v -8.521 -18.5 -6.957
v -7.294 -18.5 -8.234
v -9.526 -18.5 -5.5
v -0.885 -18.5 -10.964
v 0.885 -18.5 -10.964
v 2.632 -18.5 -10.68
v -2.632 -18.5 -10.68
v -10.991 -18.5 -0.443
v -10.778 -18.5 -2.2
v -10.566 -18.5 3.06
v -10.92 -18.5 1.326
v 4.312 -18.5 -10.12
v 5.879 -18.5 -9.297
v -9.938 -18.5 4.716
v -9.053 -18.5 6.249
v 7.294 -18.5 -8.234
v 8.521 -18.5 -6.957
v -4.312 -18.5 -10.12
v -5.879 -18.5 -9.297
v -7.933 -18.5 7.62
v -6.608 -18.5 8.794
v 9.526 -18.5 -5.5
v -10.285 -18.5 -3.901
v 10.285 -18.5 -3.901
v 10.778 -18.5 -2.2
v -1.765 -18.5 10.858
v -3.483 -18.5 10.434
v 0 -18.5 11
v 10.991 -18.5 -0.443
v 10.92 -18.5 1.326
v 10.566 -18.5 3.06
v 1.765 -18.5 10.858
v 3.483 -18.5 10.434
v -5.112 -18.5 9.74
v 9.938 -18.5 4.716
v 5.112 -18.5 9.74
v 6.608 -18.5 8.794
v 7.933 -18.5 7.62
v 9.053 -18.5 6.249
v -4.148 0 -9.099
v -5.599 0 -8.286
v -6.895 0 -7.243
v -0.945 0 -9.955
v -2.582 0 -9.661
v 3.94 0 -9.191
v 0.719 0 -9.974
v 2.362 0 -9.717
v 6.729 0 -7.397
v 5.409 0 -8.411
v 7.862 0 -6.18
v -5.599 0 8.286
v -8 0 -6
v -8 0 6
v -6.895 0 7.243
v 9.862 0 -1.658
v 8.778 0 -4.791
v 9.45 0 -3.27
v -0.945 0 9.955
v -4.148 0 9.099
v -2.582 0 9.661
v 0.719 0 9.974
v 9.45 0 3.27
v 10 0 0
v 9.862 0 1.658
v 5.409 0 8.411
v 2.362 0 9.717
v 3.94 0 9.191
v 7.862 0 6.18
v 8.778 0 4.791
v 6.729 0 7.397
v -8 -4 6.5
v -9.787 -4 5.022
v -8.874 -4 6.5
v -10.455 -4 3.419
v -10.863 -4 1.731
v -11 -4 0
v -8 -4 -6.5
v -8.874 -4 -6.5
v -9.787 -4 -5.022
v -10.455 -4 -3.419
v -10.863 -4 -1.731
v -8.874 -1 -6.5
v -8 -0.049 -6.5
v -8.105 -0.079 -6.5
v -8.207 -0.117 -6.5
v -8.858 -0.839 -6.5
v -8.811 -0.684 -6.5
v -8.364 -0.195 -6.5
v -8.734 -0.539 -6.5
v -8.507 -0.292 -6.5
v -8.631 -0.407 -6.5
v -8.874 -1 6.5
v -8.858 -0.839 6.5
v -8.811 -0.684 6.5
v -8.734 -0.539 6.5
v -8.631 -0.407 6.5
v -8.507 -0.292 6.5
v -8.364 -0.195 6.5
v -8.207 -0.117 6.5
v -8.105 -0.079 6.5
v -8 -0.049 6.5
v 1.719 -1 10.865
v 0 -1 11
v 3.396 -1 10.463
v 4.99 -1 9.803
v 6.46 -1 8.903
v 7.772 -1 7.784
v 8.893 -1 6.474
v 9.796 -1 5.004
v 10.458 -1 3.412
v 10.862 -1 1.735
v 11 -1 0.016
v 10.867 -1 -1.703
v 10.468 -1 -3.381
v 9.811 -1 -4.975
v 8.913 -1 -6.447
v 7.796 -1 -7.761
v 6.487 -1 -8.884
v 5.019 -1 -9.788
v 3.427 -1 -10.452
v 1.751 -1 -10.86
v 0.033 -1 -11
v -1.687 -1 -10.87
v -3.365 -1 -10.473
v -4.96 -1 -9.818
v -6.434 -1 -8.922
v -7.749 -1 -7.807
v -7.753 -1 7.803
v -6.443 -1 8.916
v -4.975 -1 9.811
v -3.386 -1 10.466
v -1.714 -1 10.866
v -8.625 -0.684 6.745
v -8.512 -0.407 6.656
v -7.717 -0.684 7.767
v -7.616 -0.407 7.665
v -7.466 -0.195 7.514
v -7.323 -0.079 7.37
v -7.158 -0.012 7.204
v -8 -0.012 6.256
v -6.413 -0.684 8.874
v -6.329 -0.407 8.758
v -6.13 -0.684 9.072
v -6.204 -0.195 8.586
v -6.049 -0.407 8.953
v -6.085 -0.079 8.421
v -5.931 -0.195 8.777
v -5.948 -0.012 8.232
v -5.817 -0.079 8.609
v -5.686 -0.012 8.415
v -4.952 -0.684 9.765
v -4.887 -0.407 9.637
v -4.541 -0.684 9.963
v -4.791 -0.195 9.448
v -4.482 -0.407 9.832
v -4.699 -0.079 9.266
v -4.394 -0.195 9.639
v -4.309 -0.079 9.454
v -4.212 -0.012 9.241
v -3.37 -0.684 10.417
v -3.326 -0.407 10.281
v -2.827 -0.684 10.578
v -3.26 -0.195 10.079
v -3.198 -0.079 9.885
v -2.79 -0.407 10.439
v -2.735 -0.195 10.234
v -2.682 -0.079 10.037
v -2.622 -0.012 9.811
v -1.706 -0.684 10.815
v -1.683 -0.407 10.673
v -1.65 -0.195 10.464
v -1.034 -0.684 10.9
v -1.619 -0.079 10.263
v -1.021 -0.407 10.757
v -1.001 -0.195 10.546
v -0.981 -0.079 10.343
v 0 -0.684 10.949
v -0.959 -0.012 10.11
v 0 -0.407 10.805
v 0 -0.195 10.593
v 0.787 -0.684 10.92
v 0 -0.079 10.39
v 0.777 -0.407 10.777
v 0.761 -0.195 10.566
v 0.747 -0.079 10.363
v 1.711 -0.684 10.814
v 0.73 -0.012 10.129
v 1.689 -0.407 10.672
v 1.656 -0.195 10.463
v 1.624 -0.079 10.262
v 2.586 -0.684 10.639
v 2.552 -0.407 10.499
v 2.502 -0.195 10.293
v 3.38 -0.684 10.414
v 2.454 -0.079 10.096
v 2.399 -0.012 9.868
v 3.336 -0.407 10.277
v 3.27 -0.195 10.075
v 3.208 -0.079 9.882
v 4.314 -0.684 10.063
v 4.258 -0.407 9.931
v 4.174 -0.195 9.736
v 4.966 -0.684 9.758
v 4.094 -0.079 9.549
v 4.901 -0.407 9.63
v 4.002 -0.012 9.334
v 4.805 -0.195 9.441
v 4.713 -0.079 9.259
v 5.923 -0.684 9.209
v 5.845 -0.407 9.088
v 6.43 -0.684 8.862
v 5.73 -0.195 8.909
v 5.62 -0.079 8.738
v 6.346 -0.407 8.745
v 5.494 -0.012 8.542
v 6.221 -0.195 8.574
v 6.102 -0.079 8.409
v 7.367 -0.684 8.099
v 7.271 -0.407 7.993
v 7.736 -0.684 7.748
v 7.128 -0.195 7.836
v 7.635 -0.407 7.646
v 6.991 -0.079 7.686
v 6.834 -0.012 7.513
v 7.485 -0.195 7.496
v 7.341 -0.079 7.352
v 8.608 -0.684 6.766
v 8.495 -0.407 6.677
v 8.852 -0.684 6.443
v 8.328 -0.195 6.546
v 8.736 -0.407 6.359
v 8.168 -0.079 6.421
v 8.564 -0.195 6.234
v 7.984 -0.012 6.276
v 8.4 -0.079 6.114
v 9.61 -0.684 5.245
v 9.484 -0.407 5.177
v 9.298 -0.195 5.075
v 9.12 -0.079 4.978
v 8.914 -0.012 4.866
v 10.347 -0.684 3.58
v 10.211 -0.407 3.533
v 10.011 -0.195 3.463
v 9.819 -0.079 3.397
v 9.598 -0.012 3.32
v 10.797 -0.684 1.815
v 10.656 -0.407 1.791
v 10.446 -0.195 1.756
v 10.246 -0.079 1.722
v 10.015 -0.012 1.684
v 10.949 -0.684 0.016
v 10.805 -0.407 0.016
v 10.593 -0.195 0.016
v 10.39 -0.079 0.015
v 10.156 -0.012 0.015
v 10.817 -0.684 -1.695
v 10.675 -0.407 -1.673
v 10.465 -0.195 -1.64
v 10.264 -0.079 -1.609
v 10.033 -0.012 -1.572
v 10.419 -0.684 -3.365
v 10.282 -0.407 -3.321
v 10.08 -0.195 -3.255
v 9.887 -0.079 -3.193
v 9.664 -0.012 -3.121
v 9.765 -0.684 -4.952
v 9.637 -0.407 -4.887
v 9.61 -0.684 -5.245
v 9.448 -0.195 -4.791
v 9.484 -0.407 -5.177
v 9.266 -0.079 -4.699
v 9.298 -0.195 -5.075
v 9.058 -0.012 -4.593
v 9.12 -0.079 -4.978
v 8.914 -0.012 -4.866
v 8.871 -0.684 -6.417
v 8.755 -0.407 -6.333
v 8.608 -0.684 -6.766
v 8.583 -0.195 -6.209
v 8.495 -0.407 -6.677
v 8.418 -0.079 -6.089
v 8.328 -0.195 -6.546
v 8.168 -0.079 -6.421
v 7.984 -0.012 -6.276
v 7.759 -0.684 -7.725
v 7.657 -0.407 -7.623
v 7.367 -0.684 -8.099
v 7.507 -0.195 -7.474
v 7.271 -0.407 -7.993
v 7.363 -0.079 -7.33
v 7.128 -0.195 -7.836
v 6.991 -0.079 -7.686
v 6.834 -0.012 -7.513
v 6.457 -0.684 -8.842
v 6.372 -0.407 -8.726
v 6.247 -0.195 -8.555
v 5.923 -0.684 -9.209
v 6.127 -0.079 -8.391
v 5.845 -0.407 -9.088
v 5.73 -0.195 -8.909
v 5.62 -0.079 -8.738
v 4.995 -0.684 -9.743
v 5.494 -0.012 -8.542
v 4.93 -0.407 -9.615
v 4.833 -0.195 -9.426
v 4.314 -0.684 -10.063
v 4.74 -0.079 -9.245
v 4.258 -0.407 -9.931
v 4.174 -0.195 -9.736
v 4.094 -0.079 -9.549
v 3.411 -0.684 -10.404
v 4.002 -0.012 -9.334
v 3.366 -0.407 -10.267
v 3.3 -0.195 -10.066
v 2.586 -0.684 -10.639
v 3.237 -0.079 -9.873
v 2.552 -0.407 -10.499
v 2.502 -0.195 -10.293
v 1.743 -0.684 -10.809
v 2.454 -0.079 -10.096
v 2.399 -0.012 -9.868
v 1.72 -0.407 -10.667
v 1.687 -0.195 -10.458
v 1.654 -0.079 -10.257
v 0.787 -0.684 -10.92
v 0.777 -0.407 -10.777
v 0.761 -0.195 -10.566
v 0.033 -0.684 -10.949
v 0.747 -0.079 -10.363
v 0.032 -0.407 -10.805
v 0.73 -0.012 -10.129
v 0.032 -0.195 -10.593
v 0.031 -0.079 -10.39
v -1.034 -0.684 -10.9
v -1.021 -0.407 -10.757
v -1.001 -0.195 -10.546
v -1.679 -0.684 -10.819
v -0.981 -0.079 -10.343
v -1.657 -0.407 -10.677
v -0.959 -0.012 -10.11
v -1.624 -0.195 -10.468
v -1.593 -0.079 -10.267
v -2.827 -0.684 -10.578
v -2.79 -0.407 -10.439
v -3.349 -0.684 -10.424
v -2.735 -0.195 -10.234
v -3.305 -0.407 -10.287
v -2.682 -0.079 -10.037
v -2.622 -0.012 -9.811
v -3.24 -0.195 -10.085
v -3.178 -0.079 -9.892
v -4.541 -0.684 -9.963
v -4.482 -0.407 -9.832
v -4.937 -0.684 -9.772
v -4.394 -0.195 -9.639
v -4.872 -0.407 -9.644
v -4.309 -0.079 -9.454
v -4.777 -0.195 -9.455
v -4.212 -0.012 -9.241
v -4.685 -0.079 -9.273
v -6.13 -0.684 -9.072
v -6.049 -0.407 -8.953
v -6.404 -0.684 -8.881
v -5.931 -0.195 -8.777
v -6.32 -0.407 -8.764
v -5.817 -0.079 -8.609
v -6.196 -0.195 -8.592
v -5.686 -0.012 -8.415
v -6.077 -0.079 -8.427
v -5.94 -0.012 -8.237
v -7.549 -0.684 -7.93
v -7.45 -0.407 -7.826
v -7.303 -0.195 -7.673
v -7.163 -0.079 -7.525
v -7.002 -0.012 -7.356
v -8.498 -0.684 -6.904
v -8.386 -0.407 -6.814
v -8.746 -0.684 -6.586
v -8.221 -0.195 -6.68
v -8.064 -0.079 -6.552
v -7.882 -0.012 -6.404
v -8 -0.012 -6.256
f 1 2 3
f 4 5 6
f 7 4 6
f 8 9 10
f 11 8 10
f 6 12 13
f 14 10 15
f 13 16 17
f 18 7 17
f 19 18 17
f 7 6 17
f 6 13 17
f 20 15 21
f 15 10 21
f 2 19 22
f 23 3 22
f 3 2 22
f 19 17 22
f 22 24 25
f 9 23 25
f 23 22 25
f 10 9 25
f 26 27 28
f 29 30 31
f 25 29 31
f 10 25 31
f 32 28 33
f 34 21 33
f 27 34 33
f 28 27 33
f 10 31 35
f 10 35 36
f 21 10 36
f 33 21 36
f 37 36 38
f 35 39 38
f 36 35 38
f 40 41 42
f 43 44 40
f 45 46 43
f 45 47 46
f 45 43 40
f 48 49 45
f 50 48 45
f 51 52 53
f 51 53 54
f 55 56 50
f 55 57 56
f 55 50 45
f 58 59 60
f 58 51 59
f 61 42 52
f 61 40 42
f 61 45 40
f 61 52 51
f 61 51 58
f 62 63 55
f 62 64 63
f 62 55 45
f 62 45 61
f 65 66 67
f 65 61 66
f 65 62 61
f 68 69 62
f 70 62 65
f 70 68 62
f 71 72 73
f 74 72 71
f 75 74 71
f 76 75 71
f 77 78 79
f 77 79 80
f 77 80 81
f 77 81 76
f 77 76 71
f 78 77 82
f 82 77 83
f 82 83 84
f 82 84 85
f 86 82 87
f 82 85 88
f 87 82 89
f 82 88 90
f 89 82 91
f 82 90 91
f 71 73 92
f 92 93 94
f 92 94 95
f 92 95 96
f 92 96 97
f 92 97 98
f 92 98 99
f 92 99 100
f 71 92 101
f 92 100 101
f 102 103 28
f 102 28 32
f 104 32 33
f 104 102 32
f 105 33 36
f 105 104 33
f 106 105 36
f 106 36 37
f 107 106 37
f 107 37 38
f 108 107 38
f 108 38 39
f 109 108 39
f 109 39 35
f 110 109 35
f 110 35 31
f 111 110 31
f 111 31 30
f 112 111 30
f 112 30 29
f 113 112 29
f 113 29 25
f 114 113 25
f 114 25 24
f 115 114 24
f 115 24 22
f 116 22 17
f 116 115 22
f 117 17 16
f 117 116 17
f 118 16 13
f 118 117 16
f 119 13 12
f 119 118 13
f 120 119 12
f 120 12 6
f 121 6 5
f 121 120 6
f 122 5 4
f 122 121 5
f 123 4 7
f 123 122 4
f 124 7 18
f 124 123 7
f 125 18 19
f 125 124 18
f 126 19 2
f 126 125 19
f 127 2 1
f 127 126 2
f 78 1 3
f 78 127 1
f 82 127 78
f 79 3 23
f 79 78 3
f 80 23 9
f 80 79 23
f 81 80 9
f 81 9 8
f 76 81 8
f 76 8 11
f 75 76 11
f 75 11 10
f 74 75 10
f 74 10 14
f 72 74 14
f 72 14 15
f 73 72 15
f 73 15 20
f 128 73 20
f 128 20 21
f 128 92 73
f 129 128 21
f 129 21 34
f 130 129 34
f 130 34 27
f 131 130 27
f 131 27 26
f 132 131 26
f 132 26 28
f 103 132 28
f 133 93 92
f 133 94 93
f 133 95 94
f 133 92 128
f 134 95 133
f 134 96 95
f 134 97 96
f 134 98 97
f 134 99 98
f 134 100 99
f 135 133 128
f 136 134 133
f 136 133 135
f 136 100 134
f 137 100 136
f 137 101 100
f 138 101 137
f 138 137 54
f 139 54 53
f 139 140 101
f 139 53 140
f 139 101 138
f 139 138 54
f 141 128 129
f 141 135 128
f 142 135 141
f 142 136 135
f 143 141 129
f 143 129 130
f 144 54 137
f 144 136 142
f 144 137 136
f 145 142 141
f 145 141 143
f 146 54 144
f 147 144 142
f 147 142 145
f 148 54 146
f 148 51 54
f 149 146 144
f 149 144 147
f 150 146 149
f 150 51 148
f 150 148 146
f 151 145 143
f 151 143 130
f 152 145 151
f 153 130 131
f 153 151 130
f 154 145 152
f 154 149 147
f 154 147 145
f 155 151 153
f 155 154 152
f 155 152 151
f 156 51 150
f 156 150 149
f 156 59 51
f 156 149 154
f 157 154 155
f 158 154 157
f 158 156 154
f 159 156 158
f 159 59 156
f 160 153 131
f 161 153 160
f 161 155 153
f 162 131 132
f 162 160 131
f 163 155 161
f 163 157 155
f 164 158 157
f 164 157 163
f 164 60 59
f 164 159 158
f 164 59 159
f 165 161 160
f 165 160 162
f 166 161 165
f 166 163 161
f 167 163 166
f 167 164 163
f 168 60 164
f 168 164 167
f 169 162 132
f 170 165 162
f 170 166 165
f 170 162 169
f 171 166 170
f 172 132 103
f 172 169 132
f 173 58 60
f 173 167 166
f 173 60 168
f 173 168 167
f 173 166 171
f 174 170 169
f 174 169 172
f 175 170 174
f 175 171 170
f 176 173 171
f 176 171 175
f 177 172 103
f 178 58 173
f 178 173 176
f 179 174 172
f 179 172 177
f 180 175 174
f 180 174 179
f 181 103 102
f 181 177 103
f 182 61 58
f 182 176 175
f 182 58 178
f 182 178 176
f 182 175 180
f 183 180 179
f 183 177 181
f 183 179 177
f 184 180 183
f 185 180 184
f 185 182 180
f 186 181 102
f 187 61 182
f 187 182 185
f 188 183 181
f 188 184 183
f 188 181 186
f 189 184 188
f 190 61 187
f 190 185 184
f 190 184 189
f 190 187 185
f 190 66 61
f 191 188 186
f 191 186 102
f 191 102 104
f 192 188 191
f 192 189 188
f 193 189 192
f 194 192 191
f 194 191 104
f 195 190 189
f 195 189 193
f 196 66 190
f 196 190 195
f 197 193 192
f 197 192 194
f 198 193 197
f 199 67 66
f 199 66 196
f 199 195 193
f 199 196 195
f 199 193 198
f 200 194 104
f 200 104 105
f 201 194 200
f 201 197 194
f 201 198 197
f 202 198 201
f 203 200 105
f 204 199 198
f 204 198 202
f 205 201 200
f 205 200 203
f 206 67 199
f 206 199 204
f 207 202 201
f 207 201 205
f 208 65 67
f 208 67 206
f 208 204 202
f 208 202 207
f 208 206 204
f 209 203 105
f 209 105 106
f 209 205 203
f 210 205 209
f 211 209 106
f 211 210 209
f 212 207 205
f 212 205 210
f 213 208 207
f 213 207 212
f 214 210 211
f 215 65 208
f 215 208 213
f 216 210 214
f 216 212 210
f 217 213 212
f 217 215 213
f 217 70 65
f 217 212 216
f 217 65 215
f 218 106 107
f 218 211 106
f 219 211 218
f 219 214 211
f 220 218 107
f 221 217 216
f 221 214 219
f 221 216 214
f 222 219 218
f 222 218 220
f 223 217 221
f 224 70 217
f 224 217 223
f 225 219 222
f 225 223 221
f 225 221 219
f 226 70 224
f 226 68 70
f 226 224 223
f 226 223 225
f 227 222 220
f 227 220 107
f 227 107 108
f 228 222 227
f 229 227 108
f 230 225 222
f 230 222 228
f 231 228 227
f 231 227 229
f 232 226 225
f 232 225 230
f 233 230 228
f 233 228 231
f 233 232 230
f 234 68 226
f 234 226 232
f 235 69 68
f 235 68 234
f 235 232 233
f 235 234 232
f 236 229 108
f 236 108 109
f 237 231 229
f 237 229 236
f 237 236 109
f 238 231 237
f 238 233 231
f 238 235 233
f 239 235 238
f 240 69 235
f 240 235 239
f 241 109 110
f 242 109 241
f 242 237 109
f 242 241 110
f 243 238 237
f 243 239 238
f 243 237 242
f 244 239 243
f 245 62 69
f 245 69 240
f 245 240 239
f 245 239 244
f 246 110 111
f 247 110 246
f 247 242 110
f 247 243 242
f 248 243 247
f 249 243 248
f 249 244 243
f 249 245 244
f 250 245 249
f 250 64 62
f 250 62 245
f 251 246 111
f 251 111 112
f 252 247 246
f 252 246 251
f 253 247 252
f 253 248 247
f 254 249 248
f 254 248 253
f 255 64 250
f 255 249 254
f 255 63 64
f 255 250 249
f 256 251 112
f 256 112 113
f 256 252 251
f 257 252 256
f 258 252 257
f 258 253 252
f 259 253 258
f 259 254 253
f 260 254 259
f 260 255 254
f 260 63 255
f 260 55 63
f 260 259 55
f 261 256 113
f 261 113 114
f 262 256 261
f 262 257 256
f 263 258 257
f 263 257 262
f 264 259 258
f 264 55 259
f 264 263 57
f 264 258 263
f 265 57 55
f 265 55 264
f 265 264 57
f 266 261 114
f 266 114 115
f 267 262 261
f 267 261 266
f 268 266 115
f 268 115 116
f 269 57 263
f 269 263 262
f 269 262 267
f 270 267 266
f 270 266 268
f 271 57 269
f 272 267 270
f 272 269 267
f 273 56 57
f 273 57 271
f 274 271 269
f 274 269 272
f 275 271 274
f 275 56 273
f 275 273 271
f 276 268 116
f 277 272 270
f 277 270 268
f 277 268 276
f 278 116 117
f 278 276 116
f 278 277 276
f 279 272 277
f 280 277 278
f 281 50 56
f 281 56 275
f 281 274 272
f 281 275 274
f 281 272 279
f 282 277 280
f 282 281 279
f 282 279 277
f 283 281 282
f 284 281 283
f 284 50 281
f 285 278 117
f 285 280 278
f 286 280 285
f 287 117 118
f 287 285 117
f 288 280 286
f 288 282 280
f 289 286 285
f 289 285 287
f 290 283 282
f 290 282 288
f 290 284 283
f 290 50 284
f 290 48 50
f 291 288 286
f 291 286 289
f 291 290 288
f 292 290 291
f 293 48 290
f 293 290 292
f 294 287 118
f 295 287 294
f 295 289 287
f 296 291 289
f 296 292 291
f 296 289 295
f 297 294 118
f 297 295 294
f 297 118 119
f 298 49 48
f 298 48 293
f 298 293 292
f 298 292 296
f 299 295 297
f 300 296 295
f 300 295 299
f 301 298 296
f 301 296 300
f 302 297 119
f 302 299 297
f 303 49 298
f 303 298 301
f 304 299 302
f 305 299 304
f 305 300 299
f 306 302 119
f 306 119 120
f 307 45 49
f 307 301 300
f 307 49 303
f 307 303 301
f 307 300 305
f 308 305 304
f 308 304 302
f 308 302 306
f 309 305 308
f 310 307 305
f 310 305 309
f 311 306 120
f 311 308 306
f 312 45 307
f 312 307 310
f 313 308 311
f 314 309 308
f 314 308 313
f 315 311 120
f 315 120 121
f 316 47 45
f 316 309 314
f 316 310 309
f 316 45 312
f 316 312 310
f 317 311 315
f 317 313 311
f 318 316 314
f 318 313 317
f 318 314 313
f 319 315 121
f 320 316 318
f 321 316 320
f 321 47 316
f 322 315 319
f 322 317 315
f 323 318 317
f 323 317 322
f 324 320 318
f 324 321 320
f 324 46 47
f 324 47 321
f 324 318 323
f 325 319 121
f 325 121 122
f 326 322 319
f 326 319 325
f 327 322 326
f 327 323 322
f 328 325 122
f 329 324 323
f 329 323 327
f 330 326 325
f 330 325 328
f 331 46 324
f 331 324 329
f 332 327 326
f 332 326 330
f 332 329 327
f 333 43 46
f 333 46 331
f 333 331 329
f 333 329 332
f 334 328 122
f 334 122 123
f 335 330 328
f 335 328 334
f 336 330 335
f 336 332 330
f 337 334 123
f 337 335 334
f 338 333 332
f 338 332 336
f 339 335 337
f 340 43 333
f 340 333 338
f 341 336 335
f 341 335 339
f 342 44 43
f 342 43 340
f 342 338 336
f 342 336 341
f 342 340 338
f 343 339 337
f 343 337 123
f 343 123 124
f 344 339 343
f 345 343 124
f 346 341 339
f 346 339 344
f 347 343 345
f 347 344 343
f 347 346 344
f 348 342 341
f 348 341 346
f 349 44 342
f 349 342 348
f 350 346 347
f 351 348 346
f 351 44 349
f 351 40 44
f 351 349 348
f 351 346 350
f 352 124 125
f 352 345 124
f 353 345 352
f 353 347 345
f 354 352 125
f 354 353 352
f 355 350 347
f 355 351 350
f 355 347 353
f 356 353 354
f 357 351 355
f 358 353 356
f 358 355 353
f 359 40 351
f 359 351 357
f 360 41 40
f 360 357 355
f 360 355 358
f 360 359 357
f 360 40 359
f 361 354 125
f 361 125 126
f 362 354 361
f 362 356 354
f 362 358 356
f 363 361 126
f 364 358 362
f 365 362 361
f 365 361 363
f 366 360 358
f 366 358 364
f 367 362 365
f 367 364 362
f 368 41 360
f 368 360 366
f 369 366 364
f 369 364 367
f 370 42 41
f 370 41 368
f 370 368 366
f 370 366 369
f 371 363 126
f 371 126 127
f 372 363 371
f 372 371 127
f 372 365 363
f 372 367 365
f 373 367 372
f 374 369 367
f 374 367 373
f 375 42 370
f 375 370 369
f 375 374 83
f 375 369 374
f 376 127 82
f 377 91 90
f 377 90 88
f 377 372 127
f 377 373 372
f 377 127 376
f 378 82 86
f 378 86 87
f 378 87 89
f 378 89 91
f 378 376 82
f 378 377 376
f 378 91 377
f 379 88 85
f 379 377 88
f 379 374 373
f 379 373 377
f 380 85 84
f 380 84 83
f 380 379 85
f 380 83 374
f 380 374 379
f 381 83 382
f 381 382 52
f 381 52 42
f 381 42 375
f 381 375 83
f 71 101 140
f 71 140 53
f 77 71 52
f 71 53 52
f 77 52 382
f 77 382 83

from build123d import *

# Parameters (mm, degrees)
SKETCH1_R           = 11
BOSS_EXTRUDE1_DEPTH = 18.5
CUT_EXTRUDE1_DEPTH  = 4
FILLET1_R           = 1


with BuildPart() as part:
    # Sketch1 → Boss-Extrude1 (new body)
    with BuildSketch(Plane(origin=(0, 0, 0), x_dir=(1, 0, 0), z_dir=(0, 1, 0))):
        with Locations(Location((0, 0, 0), (0, 0, 270))):
            Circle(SKETCH1_R)
    extrude(amount=-BOSS_EXTRUDE1_DEPTH)

    # Sketch4 → Cut-Extrude1 (cut)
    with BuildSketch(Plane(origin=(0, 0, 0), x_dir=(1, 0, 0), z_dir=(0, 1, 0))):
        with BuildLine():
            Line((-8, -6.5), (-8, 0))
            Line((-8, 0), (-8, 6.5))
            Line((-8, 6.5), (-8.874119675, 6.5))
            ThreePointArc((-8.874119675, 6.5), (-11, 0), (-8.874119675, -6.5))
            Line((-8.874119675, -6.5), (-8, -6.5))
        make_face()
    extrude(amount=-CUT_EXTRUDE1_DEPTH, mode=Mode.SUBTRACT)

    # Fillet1
    fillet1_edges = [part.edges().sort_by_distance(p)[0] for p in [
        (9.810708435, 0, -4.974937186),
    ]]
    fillet(fillet1_edges, radius=FILLET1_R)


solid = part.part
